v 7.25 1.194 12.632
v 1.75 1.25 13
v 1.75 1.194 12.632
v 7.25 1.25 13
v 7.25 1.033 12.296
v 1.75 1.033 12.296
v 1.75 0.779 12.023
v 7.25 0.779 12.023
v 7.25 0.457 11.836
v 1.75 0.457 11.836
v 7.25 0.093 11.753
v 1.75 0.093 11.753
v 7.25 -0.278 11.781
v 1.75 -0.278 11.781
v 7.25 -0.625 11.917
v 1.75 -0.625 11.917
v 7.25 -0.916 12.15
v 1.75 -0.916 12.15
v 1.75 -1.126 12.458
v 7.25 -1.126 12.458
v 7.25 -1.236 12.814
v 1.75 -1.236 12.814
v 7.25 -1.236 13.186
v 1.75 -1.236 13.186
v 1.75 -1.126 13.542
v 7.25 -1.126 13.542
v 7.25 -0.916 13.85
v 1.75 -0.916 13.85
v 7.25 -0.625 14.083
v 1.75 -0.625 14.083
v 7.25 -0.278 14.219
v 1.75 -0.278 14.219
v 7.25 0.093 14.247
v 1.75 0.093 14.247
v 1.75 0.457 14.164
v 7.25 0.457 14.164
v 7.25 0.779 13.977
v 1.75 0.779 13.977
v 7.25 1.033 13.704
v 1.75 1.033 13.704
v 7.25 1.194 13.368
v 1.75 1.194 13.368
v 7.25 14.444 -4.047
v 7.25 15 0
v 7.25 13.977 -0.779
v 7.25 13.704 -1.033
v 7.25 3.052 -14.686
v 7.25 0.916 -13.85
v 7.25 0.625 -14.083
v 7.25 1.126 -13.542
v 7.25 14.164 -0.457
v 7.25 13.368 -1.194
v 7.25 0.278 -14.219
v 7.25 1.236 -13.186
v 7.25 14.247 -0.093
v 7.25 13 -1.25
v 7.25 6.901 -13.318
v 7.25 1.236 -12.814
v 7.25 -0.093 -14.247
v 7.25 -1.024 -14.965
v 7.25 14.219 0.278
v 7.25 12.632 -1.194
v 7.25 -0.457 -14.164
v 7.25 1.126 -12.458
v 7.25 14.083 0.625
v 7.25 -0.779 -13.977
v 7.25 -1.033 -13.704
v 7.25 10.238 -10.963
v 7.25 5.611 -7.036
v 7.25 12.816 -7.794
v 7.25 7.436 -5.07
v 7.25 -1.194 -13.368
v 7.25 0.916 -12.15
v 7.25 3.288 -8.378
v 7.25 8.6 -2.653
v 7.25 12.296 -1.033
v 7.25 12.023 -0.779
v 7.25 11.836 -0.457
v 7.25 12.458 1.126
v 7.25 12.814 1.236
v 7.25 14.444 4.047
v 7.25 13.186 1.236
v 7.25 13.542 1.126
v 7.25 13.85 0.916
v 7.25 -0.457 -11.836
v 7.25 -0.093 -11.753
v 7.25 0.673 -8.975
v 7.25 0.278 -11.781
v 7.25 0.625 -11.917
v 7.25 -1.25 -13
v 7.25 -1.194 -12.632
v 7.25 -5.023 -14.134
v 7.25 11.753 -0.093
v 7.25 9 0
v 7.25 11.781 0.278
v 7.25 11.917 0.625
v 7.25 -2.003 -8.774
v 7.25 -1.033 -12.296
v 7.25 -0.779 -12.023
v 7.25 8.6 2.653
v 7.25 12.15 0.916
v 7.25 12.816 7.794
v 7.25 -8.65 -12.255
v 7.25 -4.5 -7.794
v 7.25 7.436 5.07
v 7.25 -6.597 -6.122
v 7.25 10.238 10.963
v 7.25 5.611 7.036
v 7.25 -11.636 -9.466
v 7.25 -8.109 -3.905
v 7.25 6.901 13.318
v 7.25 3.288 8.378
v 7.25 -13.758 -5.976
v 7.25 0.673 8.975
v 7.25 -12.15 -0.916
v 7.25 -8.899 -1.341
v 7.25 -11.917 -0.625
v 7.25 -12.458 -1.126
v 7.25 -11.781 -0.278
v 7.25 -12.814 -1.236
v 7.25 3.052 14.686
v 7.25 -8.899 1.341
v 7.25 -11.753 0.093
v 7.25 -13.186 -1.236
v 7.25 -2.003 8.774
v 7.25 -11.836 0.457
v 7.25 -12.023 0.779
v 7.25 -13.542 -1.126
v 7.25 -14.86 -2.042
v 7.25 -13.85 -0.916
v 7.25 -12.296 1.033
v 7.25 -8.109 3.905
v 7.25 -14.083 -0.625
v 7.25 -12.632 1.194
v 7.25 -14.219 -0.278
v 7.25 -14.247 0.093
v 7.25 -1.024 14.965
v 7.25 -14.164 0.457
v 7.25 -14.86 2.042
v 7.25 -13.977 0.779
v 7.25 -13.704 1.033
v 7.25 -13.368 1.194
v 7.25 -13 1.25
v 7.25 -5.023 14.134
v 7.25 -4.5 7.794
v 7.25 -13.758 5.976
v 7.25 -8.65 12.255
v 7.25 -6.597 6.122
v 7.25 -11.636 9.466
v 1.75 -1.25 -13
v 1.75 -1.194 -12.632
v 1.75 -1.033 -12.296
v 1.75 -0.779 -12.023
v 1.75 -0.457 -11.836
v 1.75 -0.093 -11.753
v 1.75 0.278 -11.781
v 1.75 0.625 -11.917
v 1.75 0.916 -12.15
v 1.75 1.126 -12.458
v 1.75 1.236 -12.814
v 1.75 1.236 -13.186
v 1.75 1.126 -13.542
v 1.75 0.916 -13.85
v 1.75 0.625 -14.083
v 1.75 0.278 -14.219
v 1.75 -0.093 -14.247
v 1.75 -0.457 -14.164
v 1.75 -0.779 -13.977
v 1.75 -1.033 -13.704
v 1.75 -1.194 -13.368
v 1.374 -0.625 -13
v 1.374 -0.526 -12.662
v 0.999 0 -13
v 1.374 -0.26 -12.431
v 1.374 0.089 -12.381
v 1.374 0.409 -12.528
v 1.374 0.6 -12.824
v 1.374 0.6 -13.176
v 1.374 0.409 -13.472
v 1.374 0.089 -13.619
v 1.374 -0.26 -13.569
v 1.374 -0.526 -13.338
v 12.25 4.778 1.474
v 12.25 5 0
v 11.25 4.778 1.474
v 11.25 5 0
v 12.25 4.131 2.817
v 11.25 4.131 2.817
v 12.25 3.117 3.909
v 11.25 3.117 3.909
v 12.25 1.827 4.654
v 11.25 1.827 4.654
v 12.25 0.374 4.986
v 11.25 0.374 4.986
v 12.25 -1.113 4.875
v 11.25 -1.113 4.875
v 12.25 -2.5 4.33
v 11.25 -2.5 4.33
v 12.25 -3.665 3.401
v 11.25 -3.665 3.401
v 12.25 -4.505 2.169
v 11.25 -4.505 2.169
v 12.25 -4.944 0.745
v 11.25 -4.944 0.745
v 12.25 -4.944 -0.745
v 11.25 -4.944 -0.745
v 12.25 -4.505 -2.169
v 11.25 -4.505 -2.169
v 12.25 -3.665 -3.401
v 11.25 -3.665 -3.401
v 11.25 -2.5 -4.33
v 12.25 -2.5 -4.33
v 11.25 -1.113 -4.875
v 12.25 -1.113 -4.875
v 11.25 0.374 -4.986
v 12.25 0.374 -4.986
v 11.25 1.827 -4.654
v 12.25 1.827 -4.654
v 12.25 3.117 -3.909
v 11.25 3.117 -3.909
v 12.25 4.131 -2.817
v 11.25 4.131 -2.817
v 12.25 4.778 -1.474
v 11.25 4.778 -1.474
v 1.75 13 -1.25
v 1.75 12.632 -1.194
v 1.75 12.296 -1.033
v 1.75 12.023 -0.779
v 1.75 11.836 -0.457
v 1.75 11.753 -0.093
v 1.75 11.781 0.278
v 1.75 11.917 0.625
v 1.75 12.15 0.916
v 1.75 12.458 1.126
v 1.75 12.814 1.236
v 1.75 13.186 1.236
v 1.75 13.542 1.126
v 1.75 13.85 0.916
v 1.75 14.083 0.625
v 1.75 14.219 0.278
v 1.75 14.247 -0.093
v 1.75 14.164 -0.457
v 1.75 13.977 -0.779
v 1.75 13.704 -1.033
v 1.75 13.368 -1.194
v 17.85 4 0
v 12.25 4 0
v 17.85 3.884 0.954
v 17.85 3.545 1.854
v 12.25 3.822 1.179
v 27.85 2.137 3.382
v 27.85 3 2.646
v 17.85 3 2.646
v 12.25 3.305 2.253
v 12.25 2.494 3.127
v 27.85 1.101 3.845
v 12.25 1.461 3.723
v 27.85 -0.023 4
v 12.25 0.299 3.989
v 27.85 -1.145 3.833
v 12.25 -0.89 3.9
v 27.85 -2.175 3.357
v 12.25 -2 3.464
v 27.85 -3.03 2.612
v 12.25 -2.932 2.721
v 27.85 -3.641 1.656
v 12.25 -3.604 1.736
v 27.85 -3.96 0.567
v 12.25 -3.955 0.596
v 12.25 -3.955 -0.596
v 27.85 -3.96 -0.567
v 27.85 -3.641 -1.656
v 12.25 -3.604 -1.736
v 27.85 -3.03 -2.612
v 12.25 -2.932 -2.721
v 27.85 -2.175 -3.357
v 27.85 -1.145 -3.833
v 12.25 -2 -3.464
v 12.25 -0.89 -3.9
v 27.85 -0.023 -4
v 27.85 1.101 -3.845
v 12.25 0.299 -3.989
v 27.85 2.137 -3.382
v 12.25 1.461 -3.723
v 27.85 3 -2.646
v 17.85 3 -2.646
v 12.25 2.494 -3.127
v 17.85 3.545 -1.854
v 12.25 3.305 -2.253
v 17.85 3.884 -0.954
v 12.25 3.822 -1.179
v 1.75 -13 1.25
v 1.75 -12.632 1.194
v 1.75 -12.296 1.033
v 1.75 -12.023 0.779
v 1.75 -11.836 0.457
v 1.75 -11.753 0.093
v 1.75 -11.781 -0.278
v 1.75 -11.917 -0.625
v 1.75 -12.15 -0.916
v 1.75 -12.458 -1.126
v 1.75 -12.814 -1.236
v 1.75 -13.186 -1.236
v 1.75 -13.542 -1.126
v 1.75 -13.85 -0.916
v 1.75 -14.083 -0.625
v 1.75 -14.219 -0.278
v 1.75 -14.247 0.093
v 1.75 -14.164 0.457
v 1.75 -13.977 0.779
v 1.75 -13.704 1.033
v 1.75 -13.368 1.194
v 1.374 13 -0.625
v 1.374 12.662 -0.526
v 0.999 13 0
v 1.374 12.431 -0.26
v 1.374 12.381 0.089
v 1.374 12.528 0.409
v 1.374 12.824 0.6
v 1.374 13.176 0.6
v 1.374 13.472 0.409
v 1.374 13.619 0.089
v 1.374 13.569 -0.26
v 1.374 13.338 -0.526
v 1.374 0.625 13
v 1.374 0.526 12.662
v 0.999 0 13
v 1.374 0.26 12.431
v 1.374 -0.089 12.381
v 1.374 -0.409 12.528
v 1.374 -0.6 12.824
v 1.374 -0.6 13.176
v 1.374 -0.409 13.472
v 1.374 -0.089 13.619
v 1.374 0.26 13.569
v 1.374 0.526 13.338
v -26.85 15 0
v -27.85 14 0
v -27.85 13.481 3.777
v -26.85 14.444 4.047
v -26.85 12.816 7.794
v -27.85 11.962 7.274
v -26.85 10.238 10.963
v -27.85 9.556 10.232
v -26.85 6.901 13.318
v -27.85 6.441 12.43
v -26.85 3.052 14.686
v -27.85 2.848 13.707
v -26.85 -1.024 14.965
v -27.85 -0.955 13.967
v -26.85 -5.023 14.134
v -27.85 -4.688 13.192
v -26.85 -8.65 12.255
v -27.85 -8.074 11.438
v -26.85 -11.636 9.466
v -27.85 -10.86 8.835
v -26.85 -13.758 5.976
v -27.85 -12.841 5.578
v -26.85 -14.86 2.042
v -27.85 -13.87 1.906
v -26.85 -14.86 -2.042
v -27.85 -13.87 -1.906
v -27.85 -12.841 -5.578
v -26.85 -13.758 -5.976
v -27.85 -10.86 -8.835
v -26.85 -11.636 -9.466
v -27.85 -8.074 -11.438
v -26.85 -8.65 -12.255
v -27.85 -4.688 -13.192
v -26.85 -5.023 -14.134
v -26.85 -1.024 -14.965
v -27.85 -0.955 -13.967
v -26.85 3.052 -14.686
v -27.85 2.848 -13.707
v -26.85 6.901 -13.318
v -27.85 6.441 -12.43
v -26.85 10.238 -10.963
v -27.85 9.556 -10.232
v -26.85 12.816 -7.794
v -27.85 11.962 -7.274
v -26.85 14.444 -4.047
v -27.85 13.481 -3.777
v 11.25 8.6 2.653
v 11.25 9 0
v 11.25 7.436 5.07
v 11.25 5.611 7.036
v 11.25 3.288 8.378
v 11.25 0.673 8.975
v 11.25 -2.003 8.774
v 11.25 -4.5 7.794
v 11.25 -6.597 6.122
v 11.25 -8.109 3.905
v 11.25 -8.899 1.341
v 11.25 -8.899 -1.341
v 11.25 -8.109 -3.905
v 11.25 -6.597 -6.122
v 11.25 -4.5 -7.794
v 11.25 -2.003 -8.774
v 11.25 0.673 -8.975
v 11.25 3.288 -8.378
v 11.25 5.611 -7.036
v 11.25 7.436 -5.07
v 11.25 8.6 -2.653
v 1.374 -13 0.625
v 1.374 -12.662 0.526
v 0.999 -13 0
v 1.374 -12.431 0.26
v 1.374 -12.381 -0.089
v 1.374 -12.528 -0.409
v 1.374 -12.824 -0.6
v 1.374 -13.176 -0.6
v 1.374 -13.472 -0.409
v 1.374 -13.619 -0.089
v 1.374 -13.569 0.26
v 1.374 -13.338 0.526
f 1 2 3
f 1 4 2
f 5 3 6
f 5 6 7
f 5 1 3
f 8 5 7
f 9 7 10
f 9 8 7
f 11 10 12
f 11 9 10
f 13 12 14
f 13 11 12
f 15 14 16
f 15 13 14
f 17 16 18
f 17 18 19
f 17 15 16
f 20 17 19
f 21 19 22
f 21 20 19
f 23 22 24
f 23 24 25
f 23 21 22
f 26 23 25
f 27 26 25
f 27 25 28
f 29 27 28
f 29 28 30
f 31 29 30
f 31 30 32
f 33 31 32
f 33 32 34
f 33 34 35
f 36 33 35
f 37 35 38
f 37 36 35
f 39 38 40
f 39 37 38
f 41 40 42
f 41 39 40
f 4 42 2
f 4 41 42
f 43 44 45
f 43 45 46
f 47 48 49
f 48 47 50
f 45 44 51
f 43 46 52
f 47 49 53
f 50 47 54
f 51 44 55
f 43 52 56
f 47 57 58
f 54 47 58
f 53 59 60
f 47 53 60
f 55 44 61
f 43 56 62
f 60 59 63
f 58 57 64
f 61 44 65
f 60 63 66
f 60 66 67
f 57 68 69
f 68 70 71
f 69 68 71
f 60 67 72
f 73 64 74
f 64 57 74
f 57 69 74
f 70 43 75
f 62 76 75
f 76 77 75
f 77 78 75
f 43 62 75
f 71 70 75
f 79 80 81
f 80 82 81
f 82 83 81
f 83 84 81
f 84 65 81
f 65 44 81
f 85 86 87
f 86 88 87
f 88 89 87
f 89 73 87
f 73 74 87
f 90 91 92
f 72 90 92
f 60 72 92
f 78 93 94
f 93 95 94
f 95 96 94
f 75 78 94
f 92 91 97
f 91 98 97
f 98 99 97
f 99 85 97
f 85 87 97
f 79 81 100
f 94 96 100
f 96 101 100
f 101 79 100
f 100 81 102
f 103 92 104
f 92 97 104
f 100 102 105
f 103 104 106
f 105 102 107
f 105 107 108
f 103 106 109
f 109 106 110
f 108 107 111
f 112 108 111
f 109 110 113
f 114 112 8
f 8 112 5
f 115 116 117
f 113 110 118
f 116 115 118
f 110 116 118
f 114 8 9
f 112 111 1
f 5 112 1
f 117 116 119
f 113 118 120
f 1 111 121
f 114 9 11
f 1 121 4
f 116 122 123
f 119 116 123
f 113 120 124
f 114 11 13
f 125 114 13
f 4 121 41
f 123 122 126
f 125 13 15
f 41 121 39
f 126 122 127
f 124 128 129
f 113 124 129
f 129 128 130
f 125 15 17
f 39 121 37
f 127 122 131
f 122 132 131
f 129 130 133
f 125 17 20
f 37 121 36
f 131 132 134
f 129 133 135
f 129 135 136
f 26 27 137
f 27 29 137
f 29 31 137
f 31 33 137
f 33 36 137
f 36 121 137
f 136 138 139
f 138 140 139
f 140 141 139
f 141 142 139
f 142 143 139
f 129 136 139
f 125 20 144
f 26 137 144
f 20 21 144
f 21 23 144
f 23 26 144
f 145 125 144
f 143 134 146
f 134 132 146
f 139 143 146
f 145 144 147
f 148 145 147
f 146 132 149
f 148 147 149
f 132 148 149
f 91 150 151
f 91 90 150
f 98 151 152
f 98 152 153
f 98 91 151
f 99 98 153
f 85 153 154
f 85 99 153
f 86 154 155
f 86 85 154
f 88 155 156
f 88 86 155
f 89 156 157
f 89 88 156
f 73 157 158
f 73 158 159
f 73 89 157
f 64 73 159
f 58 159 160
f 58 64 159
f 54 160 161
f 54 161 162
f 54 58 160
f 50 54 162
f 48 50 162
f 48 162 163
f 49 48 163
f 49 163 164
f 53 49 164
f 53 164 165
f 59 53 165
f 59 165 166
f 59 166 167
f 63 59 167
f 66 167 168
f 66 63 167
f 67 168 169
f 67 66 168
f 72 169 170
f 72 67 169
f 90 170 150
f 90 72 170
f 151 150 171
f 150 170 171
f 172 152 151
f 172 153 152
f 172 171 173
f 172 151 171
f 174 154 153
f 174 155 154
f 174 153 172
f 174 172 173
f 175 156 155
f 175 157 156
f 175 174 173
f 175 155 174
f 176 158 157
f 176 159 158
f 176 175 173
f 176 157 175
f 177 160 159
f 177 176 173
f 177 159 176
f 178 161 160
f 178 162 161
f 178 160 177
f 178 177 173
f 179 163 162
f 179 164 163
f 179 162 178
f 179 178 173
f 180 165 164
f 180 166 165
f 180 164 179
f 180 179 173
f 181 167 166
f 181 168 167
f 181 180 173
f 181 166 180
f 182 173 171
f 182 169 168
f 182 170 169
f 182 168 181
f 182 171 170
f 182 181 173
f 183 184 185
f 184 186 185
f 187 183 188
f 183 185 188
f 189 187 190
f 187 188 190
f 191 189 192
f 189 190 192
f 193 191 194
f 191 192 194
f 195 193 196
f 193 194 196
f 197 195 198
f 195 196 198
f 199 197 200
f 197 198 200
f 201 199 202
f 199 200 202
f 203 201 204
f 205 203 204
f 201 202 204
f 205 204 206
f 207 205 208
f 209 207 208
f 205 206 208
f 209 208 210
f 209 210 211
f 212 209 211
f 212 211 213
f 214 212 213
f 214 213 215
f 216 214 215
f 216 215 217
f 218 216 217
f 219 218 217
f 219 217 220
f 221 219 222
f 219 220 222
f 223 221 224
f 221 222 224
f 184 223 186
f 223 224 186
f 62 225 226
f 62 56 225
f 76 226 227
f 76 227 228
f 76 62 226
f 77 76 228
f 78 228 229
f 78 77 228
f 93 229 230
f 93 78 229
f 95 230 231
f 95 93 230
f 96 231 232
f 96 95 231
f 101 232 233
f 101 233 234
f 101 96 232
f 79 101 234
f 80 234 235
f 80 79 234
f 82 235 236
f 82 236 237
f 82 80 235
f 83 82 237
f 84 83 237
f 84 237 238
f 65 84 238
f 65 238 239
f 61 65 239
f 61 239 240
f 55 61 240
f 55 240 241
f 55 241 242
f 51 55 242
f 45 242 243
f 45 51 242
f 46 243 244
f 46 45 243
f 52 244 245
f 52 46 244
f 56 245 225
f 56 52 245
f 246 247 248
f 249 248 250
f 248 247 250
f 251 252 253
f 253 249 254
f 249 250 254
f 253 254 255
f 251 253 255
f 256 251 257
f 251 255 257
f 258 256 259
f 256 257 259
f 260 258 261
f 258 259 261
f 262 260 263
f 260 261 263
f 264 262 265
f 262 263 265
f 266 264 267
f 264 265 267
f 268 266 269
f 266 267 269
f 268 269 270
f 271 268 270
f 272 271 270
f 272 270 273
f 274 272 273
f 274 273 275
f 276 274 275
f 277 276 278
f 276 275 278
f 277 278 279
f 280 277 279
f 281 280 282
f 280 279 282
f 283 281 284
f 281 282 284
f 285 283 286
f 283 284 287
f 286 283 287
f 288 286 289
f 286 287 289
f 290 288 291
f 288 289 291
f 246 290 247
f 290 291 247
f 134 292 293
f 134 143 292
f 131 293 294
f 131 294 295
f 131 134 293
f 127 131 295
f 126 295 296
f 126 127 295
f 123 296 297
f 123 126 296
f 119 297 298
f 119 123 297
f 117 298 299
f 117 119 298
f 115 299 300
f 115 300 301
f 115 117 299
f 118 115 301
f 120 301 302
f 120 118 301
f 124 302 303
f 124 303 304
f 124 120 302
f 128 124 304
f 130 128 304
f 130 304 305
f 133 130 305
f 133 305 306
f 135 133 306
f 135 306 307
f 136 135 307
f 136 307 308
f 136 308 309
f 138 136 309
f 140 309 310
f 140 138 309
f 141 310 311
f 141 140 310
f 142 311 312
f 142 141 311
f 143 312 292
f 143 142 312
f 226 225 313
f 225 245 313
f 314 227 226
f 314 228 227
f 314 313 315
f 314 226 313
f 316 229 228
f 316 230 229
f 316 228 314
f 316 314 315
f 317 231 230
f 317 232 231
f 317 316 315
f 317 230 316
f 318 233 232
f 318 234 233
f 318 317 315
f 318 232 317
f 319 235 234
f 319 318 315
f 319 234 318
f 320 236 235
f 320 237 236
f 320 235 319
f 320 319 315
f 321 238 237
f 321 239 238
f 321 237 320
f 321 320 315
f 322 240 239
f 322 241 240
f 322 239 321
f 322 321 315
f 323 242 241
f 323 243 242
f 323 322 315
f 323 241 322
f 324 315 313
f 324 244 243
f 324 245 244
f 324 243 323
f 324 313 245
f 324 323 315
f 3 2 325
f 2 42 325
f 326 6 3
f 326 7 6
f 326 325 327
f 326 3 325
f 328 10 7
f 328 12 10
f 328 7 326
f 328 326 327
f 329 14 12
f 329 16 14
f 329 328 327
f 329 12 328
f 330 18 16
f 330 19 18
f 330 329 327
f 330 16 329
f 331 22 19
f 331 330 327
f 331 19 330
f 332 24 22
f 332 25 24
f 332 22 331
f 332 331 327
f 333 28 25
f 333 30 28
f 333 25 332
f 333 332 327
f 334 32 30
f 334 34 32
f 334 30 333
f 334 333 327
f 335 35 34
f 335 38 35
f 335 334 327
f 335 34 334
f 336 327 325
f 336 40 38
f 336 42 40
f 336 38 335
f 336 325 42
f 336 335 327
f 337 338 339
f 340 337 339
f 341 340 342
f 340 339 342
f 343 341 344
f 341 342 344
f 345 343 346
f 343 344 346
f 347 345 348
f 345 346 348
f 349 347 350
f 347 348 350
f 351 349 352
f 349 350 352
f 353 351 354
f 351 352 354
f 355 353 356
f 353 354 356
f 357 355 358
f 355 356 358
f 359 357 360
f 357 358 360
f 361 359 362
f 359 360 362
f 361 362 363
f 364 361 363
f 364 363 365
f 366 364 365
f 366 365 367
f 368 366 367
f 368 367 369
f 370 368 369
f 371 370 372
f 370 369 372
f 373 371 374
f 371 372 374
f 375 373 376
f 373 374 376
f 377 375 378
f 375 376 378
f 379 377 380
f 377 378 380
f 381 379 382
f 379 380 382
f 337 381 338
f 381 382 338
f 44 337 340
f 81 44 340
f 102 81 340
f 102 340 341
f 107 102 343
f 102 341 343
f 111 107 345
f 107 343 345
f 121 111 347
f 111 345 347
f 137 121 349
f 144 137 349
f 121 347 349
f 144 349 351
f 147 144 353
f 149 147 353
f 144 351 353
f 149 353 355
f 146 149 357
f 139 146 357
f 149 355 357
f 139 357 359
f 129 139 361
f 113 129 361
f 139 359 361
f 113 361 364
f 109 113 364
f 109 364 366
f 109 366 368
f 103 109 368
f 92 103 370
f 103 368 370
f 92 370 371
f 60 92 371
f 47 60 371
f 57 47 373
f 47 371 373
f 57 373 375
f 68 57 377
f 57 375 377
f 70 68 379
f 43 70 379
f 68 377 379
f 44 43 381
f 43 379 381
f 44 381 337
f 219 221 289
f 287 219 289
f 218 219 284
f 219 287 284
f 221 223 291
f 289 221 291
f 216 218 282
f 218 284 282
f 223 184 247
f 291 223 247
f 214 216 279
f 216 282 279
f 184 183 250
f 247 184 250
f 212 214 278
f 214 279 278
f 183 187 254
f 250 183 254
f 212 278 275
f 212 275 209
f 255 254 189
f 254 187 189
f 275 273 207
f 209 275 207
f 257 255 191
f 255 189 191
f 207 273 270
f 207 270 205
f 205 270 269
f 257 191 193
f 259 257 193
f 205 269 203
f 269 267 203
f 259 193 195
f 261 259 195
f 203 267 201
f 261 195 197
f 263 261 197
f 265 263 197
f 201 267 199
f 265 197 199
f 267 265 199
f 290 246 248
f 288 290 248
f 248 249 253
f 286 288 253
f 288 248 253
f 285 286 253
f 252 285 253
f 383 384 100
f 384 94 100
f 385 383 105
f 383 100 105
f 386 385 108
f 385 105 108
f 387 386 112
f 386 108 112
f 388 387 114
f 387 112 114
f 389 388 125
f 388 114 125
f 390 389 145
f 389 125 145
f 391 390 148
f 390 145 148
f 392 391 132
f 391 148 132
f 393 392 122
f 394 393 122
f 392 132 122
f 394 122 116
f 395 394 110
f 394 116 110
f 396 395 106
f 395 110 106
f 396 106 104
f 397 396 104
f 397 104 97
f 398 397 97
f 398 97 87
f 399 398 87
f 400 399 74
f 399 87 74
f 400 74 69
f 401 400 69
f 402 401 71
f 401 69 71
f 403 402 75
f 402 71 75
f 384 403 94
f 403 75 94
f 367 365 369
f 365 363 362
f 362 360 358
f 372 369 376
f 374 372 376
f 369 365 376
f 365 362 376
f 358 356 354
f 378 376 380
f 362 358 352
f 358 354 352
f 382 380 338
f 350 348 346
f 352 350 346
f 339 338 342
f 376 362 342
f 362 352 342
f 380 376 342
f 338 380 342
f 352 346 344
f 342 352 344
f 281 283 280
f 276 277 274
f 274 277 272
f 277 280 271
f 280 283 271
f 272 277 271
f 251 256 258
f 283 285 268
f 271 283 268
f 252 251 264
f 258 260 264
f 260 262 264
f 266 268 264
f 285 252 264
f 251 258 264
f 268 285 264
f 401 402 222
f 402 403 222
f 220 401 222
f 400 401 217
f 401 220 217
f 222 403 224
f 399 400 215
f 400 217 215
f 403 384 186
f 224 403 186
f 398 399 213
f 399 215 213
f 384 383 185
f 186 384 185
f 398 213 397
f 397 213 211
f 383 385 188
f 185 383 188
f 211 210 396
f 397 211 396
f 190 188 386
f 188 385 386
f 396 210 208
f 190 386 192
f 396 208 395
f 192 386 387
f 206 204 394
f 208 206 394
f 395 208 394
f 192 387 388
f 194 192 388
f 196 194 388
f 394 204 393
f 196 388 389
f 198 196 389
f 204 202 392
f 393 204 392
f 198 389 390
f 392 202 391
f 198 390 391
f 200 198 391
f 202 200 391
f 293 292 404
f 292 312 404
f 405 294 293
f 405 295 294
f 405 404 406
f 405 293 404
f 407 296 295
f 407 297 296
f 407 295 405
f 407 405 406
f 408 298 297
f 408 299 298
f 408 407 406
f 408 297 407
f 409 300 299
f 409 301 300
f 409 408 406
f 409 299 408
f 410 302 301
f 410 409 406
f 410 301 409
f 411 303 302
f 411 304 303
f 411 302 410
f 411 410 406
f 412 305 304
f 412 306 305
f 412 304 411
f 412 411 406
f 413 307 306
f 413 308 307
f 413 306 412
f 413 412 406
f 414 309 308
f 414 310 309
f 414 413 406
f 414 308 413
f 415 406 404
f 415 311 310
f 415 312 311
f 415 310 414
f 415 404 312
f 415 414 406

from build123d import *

# Parameters (mm, degrees)
EXTRUSION1_DEPTH             = 10
R_P_TITION_CIRCULAIRE1_COUNT = 4
CHANFREIN1_SIZE              = 1


with BuildPart() as part:
    # Esquisse1 → Révolution1 (revolve)
    with BuildSketch(Plane.XY):
        Polygon((27.85, 0), (27.85, 4), (12.25, 4), (12.25, 5), (11.25, 5), (11.25, 9), (7.25, 9), (7.25, 15), (-27.85, 15), (-27.85, 0), align=None)
    revolve(axis=Axis((-27.85, 0, 0), (1, 0, 0)))

    # Esquisse2 → Extrusion1 (cut)
    with BuildSketch(Plane(origin=(27.85, 0, 0), x_dir=(0, 0, -1), z_dir=(1, 0, 0))):
        with BuildLine():
            Line((2.645751311, 3), (-2.645751311, 3))
            ThreePointArc((-2.645751311, 3), (0, 4), (2.645751311, 3))
        make_face()
    extrude(amount=-EXTRUSION1_DEPTH, mode=Mode.SUBTRACT)

    # Esquisse3 → Trou taraudé M31 (revolve, cut)
    with BuildSketch(Plane(origin=(7.25, 13, 0), x_dir=(0, 0, -1), z_dir=(0, 1, 0))):
        Polygon((0, 0), (0, 6.251075774), (1.25, 5.5), (1.25, 0), align=None)
    trou_taraud_m31 = revolve(axis=Axis((13.6, 13, 0), (-1, 0, 0)), mode=Mode.SUBTRACT)

    # Répétition circulaire1: Trou taraudé M31 ×4 about axis
    r_p_tition_circulaire1_axis = Axis((0, 0, 0), (1, 0, 0))
    for i in range(1, R_P_TITION_CIRCULAIRE1_COUNT):
        add(trou_taraud_m31.rotate(r_p_tition_circulaire1_axis, i * 360 / R_P_TITION_CIRCULAIRE1_COUNT), mode=Mode.SUBTRACT)

    # Chanfrein1
    chanfrein1_edges = [part.edges().sort_by_distance(p)[0] for p in [
        (-27.85, -15, 0),
    ]]
    chamfer(chanfrein1_edges, length=CHANFREIN1_SIZE)


solid = part.part
